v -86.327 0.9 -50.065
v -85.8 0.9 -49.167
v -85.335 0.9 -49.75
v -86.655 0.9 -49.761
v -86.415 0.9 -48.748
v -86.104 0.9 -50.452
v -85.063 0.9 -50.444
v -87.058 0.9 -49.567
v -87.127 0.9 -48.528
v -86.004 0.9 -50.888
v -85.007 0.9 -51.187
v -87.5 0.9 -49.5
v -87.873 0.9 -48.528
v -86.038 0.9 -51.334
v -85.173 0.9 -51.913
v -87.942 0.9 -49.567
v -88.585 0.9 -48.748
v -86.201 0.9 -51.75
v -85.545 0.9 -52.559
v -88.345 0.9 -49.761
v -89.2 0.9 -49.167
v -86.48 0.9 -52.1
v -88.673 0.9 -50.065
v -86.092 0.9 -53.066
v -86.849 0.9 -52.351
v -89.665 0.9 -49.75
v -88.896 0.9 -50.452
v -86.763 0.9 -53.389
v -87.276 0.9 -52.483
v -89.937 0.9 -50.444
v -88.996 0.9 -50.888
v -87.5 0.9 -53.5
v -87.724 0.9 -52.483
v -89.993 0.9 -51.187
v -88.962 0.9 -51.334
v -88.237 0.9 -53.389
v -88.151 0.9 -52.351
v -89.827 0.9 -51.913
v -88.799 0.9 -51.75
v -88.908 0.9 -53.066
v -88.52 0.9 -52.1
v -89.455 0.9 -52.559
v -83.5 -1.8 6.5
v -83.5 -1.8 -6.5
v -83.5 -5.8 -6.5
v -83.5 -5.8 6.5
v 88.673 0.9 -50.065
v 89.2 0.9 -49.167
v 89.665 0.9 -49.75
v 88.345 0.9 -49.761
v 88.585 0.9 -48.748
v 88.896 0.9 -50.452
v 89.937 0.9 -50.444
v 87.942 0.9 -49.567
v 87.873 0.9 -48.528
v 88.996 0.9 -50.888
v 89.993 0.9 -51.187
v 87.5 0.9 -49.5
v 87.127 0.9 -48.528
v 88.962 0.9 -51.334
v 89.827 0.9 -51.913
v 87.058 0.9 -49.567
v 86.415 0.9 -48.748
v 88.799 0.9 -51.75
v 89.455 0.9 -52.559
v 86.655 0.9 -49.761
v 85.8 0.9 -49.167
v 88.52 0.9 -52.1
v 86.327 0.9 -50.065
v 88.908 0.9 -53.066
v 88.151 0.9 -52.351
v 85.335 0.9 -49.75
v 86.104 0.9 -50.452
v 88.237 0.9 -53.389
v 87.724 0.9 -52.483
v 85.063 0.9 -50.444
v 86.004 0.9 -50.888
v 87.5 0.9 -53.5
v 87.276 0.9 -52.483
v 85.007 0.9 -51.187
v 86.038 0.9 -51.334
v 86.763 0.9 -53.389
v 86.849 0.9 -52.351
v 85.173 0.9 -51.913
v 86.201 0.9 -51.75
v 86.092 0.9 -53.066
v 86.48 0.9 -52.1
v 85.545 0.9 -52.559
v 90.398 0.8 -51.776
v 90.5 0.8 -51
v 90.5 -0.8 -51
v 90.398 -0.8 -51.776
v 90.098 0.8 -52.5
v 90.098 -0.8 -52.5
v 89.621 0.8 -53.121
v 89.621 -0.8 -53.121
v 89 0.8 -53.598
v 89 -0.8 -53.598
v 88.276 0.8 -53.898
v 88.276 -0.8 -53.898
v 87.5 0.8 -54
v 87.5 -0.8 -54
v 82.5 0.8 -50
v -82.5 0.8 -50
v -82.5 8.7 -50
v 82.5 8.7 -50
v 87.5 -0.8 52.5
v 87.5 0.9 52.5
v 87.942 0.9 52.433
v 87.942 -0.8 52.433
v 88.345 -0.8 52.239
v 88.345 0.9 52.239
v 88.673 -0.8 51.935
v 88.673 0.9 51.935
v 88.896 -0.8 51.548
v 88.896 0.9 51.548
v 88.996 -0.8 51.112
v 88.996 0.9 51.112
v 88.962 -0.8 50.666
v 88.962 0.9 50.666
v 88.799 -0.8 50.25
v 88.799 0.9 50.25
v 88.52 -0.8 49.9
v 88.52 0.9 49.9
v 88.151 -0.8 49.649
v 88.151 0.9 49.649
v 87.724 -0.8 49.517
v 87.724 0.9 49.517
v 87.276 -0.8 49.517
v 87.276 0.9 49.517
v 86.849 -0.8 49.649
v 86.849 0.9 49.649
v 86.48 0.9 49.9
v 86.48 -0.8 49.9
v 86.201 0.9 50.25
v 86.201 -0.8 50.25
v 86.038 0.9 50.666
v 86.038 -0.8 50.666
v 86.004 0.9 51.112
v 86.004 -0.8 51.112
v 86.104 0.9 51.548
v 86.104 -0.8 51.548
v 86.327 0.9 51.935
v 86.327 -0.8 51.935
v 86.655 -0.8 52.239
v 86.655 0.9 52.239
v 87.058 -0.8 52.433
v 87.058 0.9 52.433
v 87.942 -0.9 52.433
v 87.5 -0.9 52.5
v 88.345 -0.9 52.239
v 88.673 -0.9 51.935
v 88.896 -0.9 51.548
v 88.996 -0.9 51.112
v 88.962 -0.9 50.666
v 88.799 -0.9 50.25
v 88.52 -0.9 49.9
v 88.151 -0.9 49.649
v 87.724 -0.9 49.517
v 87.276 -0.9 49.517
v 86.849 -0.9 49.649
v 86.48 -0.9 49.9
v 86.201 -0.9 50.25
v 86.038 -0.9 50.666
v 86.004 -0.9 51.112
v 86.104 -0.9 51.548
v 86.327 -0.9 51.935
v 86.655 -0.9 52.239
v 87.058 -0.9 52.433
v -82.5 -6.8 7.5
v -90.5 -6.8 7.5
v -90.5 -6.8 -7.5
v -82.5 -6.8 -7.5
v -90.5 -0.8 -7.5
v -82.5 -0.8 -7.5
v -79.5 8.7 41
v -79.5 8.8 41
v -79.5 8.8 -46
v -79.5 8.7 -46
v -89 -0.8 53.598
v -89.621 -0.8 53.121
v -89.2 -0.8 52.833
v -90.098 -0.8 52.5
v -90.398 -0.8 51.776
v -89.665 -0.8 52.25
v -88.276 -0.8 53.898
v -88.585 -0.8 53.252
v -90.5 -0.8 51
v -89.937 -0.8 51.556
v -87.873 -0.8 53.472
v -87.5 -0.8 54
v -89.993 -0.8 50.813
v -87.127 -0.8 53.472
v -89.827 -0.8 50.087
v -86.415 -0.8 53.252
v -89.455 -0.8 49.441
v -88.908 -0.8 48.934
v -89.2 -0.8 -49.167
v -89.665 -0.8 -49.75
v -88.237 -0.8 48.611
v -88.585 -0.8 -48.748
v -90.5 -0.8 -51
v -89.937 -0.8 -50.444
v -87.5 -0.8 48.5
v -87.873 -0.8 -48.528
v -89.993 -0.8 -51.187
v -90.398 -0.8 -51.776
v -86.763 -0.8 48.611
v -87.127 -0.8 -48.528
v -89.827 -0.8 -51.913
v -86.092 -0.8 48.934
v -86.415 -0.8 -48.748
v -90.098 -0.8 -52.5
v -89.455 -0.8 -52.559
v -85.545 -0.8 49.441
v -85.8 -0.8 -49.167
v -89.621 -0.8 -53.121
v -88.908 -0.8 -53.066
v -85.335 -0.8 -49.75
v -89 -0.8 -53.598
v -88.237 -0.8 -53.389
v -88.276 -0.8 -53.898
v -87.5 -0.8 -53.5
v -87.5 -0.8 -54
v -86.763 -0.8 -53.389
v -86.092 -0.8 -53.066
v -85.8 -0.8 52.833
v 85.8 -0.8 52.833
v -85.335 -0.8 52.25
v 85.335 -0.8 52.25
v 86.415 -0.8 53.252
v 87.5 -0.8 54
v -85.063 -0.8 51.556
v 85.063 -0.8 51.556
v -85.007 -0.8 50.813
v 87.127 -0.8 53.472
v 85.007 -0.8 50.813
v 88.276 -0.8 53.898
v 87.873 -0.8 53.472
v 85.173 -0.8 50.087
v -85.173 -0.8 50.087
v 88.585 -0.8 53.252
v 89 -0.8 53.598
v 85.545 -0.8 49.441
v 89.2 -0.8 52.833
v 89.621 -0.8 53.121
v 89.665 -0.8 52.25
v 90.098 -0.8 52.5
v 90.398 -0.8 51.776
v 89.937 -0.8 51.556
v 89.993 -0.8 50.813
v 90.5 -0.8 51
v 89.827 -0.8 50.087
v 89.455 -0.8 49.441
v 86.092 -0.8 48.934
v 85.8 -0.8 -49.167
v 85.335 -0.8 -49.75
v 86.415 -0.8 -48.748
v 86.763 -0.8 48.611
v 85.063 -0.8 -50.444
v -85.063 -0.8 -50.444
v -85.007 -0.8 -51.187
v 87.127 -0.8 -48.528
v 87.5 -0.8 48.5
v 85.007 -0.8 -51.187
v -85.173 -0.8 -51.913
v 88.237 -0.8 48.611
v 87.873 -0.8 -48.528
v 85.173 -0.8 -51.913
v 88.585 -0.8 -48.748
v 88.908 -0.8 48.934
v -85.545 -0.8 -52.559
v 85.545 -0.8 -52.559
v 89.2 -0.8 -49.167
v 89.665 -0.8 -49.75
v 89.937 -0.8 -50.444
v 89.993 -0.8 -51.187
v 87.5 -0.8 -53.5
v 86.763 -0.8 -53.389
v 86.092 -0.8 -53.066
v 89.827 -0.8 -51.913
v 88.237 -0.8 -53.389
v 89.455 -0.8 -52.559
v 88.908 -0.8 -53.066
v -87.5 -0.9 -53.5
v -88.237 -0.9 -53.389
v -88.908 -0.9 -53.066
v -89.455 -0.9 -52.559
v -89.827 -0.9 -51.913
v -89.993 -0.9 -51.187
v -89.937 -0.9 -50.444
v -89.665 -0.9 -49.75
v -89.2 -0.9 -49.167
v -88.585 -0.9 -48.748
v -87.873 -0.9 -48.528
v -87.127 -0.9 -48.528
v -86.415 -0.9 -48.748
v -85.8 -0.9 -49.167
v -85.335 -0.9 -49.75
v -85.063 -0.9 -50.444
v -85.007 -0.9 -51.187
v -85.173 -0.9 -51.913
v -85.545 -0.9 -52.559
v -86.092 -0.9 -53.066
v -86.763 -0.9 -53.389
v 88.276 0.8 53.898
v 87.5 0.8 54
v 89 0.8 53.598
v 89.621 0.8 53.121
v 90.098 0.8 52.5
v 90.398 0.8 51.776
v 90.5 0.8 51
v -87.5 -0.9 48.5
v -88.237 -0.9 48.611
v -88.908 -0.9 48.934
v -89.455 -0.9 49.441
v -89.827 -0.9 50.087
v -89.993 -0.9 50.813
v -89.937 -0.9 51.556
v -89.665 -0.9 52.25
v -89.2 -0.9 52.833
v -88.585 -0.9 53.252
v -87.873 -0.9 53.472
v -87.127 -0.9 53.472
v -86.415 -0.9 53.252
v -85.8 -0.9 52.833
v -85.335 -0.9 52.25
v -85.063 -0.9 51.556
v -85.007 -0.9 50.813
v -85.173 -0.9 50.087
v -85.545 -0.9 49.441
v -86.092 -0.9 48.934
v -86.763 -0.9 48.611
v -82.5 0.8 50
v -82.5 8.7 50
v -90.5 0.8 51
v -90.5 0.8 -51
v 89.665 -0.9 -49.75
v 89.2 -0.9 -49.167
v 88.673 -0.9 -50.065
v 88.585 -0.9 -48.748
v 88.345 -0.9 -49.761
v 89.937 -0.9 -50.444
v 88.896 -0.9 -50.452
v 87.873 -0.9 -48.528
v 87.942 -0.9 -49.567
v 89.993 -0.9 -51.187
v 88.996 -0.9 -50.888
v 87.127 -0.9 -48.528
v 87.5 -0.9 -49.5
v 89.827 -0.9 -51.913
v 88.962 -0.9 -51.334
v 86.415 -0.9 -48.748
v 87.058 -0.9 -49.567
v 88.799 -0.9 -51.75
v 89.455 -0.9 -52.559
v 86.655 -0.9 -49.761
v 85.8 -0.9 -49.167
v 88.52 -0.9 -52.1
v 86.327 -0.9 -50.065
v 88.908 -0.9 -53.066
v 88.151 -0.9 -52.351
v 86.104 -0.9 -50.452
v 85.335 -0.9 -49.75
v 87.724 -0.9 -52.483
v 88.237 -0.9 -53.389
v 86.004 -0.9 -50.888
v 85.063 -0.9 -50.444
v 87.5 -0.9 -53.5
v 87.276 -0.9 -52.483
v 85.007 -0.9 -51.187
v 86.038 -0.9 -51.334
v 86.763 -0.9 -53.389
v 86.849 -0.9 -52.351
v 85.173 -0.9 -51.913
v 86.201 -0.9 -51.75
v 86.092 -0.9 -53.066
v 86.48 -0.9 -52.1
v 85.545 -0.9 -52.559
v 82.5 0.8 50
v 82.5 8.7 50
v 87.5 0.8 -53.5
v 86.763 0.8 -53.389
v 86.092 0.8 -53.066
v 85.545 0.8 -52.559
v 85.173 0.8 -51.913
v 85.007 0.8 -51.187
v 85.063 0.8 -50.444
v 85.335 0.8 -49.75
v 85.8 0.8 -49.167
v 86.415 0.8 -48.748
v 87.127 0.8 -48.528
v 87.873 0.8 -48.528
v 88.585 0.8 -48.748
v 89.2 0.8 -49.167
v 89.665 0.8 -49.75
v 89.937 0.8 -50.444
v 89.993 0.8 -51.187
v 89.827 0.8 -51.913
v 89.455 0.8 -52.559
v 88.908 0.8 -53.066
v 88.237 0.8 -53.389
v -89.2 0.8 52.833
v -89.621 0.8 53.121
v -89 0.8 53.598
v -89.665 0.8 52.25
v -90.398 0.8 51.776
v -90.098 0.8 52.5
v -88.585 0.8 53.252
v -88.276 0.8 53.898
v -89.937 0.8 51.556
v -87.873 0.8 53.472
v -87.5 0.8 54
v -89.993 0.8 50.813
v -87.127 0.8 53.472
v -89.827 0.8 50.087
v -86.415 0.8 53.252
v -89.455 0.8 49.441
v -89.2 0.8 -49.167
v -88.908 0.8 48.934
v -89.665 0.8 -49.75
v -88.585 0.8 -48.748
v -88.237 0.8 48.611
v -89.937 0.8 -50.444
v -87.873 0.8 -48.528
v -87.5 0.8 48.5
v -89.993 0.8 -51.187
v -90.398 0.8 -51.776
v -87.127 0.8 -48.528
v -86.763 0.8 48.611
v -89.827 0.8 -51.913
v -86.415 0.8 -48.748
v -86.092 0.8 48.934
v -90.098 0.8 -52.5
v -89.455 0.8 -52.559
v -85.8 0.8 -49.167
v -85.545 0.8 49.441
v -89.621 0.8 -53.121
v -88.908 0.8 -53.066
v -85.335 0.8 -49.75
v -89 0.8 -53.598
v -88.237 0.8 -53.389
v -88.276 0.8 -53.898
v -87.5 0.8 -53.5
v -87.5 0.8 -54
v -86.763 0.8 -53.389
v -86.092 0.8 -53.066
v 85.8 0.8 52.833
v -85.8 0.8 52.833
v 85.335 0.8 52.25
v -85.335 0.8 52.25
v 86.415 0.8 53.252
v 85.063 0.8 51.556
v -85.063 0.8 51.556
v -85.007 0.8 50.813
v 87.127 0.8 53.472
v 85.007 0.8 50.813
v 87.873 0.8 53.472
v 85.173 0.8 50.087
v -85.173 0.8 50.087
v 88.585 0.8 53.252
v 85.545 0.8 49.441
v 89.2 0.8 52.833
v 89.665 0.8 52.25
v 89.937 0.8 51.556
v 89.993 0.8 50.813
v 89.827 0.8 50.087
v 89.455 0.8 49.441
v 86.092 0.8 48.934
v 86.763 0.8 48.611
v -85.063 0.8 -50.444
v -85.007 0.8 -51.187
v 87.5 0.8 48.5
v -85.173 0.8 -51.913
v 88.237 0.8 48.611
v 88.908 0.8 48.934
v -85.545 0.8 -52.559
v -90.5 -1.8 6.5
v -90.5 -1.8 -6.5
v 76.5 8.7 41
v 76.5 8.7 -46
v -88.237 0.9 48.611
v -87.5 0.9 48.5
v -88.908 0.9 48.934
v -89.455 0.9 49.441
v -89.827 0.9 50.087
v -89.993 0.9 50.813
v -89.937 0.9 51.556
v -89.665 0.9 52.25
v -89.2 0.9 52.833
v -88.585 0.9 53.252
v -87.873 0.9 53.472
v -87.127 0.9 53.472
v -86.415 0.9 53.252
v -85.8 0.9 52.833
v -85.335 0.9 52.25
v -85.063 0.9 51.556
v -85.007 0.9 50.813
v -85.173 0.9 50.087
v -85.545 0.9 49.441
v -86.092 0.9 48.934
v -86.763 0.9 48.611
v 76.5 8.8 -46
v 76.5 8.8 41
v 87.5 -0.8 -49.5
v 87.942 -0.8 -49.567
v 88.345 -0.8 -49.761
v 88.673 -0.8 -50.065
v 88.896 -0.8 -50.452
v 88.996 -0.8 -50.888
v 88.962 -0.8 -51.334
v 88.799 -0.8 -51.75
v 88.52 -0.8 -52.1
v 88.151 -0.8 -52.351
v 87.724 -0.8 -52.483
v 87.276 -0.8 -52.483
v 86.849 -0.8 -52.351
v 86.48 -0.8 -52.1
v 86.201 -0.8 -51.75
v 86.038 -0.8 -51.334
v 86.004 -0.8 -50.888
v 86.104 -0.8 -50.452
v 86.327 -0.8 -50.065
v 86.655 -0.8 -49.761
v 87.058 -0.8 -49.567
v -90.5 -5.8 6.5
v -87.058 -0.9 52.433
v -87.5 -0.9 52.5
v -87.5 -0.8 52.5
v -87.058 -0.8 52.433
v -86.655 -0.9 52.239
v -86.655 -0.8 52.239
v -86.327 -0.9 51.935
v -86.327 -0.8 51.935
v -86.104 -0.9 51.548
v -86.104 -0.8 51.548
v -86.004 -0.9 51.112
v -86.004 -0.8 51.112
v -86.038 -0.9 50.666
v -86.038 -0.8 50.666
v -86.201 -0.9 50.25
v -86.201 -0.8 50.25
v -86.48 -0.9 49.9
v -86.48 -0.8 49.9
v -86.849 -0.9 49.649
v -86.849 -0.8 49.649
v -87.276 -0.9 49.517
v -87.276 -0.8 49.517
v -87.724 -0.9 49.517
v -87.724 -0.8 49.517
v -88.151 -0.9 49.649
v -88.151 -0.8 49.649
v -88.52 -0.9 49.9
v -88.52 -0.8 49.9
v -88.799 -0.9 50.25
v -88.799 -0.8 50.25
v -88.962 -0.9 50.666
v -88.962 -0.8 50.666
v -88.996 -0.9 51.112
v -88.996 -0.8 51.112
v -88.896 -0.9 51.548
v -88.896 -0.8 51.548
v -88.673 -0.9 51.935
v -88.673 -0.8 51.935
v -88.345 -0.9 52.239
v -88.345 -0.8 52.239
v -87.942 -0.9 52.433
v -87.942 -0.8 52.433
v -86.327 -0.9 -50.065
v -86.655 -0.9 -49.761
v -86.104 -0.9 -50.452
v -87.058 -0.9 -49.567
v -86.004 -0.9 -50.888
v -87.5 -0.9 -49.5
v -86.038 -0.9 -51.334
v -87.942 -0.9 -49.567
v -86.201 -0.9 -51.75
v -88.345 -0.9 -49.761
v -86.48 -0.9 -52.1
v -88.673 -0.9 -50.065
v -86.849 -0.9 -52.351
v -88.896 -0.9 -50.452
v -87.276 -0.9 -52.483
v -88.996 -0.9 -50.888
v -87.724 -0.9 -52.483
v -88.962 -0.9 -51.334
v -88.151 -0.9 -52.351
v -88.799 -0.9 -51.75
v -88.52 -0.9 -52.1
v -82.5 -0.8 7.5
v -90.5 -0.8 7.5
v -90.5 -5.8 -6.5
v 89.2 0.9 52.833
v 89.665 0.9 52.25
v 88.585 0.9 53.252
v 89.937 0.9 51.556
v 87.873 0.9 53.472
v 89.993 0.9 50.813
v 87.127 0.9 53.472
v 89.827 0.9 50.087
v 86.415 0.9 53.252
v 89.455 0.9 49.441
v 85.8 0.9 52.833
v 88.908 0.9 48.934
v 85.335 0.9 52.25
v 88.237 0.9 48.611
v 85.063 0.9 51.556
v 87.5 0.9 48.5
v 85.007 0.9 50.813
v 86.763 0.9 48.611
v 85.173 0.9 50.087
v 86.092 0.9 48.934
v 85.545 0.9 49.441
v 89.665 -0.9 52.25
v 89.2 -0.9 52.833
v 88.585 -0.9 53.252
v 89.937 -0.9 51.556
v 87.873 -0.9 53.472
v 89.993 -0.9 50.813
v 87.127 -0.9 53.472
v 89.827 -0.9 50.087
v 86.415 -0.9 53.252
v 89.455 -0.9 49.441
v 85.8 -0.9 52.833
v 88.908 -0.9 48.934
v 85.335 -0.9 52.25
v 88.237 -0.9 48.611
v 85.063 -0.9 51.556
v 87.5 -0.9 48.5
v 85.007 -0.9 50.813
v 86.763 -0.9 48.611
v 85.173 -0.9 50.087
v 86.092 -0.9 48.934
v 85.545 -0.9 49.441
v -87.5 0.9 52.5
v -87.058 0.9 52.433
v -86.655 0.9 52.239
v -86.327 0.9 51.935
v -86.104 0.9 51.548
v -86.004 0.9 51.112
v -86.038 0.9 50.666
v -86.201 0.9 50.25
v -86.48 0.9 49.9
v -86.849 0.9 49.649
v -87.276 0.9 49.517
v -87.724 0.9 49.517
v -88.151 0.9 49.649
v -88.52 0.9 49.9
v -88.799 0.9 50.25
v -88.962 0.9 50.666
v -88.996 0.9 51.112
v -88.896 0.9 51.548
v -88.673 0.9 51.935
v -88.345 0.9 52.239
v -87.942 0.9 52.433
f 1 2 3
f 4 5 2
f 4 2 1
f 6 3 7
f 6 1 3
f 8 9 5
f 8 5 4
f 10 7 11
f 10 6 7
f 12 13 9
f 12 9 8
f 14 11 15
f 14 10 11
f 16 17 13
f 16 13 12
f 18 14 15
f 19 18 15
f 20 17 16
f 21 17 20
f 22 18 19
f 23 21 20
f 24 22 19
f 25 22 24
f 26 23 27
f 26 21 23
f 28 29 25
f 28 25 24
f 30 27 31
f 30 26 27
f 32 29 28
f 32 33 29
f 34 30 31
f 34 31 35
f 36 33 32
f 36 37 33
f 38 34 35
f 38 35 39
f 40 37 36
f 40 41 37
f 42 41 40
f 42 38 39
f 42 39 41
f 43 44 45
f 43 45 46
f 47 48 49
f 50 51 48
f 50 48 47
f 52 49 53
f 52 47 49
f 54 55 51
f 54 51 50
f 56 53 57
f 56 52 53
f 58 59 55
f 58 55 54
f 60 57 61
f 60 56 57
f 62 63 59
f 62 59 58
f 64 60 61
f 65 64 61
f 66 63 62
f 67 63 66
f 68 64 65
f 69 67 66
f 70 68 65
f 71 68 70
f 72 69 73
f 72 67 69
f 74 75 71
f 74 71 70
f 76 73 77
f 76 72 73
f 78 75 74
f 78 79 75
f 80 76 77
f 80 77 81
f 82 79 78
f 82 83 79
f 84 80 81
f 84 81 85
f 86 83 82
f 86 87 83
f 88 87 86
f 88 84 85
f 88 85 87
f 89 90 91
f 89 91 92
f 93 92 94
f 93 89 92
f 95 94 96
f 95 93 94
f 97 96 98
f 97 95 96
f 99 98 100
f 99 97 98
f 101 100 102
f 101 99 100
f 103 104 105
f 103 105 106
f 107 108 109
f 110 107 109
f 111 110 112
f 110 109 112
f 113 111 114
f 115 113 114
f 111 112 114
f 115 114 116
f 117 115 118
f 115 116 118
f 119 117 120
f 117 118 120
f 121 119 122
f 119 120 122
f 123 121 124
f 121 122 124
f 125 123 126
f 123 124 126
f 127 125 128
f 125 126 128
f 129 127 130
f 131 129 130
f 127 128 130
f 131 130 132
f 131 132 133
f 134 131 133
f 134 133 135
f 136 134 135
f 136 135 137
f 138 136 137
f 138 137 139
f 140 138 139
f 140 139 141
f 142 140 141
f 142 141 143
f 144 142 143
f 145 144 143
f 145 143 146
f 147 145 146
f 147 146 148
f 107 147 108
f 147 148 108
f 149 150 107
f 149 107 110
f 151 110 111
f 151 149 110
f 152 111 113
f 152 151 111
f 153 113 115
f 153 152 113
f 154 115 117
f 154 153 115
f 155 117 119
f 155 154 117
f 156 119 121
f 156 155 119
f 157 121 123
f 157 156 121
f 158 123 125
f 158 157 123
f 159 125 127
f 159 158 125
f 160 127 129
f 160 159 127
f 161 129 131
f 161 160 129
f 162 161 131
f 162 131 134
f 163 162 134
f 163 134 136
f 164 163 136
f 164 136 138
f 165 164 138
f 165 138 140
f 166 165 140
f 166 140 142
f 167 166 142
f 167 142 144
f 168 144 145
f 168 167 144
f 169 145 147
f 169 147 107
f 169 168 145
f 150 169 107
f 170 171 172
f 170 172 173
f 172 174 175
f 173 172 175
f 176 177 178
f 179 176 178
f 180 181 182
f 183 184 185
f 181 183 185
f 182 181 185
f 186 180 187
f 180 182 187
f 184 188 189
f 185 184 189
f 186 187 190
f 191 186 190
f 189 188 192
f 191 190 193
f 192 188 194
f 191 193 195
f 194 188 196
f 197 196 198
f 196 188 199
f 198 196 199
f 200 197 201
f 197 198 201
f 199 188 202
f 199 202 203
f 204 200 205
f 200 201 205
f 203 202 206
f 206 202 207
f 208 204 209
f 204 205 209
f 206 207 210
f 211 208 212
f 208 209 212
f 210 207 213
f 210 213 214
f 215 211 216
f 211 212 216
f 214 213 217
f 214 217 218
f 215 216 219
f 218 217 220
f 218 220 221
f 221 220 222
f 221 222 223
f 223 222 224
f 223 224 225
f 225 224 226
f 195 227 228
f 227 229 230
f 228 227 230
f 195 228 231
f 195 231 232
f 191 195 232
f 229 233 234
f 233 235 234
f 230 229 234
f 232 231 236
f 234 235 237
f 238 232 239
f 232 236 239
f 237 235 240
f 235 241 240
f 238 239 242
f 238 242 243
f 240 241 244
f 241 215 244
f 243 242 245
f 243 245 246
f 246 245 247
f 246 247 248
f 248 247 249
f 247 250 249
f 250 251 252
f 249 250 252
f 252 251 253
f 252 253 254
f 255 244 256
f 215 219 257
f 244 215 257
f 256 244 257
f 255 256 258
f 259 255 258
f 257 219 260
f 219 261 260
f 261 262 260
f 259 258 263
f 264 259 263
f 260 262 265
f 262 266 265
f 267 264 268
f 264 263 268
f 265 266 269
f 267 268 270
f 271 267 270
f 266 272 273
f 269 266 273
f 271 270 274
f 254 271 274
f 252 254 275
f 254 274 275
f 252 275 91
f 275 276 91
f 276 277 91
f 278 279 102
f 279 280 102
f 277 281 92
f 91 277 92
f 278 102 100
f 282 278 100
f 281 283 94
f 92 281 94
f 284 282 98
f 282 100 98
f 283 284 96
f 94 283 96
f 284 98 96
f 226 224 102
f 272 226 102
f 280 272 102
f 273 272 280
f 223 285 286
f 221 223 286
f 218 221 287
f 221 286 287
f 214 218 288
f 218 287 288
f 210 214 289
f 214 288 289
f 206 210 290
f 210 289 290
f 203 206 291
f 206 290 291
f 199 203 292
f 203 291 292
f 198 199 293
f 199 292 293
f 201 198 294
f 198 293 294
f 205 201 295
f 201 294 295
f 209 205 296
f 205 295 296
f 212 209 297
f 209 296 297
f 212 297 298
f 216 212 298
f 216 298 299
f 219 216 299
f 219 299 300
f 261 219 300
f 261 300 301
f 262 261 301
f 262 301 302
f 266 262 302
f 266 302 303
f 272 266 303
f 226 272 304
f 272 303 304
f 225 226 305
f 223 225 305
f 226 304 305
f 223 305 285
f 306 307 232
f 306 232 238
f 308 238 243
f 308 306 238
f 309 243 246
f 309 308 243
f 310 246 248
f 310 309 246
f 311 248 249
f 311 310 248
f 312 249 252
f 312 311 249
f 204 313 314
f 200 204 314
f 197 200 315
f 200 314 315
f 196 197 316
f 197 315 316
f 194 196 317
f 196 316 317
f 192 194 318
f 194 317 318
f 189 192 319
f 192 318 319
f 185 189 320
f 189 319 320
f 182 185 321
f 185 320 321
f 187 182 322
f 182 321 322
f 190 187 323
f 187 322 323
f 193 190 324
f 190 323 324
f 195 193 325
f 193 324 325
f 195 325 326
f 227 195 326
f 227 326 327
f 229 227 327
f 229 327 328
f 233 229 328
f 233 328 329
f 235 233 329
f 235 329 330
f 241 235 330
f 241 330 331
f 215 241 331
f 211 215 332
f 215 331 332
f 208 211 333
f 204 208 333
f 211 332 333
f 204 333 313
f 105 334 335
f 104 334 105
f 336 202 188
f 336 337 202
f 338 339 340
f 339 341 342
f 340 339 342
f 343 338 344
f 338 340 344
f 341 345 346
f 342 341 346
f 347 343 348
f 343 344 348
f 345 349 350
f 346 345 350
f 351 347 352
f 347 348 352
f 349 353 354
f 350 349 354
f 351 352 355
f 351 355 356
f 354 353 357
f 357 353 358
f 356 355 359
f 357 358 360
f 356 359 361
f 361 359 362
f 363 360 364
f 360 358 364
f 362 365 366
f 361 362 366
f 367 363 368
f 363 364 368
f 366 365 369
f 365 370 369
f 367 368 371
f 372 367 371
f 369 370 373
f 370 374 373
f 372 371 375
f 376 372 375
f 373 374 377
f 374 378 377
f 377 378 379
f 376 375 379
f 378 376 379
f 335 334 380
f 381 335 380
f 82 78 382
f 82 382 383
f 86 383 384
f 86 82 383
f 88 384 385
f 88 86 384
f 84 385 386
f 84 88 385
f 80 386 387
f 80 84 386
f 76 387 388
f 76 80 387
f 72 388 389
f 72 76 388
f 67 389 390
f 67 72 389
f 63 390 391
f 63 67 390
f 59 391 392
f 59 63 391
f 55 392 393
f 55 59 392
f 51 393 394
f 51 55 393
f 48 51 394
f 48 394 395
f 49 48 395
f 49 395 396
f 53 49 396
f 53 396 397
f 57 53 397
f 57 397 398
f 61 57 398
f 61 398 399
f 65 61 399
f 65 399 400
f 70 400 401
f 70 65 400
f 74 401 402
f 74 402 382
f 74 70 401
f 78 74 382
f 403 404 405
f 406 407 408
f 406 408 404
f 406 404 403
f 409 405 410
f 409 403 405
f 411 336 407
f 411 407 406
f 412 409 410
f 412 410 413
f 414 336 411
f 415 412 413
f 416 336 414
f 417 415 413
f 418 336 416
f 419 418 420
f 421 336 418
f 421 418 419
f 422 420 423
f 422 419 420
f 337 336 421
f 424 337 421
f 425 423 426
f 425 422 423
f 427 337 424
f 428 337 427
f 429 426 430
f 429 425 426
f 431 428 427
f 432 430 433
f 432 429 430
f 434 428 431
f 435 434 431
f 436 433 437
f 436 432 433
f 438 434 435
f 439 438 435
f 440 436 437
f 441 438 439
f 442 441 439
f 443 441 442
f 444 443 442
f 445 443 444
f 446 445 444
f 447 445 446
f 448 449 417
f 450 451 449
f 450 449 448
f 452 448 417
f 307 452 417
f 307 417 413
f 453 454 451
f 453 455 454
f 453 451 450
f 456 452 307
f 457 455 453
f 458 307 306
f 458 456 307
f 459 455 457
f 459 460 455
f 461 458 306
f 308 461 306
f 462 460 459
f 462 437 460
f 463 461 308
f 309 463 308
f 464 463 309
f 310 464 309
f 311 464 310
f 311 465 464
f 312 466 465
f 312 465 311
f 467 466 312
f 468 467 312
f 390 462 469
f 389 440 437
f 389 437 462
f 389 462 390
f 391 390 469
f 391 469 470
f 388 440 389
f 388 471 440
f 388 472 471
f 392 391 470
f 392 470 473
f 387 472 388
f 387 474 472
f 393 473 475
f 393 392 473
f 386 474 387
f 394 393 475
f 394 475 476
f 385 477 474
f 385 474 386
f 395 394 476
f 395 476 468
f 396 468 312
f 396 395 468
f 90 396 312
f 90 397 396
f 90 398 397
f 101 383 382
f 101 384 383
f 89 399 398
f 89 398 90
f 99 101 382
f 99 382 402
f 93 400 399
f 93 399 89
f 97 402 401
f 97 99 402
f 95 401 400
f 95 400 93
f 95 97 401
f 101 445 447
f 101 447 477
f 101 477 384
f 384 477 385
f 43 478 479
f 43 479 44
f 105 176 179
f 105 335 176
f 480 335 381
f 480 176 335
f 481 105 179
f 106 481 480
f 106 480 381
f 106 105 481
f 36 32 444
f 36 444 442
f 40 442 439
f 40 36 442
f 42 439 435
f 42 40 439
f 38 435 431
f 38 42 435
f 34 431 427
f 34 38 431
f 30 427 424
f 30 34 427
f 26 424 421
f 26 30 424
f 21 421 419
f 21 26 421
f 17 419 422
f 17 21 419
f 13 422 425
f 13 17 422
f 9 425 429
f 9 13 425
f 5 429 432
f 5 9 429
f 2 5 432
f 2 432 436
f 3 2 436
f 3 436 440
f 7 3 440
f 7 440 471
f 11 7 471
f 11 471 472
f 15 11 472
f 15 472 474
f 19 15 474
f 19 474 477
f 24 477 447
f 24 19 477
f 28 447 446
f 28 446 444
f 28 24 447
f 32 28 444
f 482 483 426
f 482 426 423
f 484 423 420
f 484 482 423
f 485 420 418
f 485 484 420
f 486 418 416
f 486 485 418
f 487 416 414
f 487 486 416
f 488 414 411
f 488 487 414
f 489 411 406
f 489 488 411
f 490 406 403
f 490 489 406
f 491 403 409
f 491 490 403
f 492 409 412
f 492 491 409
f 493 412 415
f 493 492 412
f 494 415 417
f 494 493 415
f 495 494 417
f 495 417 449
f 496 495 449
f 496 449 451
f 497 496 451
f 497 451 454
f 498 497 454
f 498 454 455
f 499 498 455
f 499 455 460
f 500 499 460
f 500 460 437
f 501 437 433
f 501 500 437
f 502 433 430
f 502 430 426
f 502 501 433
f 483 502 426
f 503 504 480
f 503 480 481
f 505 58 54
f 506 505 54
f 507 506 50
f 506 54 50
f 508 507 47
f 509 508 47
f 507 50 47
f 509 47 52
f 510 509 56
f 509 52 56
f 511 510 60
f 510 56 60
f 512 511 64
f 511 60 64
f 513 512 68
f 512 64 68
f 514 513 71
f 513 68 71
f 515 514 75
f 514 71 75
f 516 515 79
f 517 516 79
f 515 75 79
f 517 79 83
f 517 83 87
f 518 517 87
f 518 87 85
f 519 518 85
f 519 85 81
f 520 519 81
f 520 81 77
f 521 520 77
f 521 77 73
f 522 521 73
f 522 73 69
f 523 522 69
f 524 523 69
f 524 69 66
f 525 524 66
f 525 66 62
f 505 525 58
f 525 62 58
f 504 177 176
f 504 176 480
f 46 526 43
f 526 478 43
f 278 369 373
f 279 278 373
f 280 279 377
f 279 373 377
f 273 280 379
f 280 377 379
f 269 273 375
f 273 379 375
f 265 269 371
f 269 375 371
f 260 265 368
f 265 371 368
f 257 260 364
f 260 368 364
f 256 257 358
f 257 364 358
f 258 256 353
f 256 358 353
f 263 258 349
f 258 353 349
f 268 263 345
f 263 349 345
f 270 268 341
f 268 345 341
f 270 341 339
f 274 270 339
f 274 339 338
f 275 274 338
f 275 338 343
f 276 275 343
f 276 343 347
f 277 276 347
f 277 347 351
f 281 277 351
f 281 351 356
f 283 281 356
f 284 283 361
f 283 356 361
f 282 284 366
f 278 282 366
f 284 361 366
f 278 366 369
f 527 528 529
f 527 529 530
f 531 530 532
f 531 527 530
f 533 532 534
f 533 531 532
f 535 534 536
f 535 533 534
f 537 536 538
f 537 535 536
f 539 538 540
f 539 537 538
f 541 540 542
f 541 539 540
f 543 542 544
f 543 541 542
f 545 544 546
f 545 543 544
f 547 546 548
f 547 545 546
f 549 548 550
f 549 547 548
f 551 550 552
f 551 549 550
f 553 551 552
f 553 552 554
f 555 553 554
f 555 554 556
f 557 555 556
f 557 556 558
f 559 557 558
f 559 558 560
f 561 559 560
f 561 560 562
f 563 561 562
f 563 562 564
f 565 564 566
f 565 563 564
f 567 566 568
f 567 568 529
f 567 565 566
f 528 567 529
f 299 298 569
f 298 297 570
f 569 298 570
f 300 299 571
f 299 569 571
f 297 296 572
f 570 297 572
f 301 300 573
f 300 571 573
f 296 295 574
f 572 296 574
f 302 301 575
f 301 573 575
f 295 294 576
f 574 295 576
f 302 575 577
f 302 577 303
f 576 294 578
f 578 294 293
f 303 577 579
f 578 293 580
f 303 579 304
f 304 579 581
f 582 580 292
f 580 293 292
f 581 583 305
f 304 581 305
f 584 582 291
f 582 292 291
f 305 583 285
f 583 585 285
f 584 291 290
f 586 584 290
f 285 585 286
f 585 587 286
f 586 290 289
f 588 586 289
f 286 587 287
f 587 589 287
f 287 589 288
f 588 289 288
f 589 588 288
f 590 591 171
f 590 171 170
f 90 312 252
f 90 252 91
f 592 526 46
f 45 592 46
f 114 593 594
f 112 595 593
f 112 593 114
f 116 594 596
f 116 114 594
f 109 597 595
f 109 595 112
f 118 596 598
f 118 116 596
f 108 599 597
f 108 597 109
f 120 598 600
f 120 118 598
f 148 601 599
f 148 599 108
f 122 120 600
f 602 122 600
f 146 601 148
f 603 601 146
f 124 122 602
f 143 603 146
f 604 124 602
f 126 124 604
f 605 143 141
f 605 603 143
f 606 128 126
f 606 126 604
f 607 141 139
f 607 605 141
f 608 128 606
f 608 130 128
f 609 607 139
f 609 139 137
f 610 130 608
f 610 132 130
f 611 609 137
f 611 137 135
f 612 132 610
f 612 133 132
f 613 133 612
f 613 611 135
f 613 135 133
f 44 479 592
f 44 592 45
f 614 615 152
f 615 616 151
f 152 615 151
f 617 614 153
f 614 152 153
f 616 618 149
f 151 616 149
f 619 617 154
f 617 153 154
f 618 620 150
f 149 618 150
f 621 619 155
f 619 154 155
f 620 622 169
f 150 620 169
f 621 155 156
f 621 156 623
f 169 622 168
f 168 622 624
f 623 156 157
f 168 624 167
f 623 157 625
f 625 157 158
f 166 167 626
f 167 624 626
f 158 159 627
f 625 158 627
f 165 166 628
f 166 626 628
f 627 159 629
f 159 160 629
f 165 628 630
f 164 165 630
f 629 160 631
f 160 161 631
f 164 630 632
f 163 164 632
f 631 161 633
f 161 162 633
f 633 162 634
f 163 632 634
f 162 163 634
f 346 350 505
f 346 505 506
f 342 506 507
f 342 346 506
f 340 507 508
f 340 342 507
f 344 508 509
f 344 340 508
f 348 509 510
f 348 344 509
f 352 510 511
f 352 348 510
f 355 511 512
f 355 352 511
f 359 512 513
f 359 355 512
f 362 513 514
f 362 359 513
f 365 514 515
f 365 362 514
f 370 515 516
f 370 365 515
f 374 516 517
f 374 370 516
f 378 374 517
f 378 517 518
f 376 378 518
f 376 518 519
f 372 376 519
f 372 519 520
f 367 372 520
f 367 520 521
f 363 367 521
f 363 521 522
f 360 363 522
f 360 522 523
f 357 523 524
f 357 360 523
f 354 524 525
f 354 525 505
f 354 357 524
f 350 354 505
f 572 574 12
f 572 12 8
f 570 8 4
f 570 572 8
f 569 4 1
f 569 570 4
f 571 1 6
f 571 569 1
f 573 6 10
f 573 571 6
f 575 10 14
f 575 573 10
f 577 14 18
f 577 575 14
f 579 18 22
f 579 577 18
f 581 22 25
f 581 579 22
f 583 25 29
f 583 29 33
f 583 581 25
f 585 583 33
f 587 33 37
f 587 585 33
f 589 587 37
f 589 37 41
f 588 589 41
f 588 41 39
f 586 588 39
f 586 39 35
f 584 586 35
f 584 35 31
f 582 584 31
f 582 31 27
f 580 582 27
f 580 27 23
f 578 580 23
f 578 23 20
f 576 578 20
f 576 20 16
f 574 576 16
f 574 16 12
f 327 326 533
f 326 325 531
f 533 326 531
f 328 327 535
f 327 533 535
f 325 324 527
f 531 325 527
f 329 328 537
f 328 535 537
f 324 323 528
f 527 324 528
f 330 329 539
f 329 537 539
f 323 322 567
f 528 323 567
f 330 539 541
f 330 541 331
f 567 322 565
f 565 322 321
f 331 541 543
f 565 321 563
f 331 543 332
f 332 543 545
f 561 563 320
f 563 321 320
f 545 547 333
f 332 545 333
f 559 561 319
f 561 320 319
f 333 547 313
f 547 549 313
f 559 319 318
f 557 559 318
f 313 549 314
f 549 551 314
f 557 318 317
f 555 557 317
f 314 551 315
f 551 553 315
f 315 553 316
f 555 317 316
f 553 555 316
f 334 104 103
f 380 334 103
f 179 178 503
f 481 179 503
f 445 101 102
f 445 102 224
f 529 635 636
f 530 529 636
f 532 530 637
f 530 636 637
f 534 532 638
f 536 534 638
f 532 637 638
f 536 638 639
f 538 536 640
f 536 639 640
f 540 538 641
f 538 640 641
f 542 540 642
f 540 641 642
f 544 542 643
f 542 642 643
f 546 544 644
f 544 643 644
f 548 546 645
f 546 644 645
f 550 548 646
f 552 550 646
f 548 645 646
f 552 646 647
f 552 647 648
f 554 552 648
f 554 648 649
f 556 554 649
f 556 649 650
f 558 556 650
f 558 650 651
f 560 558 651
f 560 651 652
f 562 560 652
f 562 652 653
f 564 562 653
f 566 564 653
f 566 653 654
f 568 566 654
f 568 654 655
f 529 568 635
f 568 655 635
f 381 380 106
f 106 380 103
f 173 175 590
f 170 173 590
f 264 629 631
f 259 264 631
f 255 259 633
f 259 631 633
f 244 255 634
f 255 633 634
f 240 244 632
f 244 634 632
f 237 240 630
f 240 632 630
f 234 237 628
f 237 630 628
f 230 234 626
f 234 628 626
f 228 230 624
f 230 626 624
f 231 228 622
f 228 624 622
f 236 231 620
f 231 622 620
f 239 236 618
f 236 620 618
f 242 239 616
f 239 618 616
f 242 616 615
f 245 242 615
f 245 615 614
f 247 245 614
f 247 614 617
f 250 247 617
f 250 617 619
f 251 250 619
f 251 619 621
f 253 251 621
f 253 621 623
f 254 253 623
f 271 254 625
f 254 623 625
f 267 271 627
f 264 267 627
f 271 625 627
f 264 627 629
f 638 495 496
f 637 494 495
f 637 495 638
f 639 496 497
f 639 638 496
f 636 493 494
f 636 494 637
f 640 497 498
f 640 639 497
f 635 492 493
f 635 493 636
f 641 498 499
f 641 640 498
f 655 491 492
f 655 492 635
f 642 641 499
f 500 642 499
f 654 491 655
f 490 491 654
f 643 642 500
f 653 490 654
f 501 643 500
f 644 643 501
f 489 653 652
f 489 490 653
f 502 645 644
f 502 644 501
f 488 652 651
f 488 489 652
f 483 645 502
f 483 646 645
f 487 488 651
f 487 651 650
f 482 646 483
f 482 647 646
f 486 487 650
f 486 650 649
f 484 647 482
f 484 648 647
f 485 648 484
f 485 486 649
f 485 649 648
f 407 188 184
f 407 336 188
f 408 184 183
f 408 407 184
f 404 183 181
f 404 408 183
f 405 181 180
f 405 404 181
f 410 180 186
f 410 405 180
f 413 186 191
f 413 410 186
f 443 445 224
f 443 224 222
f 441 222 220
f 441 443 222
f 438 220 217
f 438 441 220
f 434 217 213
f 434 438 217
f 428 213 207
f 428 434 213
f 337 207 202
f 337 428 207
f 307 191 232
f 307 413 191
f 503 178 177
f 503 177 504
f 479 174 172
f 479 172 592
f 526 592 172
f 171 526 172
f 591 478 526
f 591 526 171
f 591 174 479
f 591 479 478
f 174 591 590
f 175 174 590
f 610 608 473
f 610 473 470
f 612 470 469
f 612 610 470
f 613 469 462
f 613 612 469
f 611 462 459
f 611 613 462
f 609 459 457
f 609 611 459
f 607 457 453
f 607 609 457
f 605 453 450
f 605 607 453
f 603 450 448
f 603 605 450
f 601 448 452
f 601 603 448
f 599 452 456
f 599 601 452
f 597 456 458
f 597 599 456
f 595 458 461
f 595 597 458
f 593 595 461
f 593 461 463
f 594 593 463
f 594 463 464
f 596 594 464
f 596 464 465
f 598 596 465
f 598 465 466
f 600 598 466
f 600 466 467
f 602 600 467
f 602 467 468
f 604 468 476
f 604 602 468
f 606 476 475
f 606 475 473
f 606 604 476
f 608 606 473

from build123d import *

# Parameters (mm, degrees)
BOSS_EXTRUDE1_DEPTH = 0.8
SKETCH2_R           = 1.5
CUT_EXTRUDE1_DEPTH  = 106.398339645
BOSS_EXTRUDE2_START = 0.1
SKETCH3_R           = 2.5
SKETCH3_R_2         = 1.5
BOSS_EXTRUDE2_DEPTH = 0.1
SKETCH4_W           = 165
SKETCH4_H           = 100
BOSS_EXTRUDE3_DEPTH = 8
SKETCH5_OUTSIDE_W   = 225.2
SKETCH5_OUTSIDE_H   = 152.2
SKETCH5_OUTSIDE_W_2 = 156
SKETCH5_OUTSIDE_H_2 = 87
CUT_EXTRUDE2_DEPTH  = 0.1
SKETCH6_W           = 8
SKETCH6_H           = 15
BOSS_EXTRUDE4_DEPTH = 6
SHELL1_T            = -1


with BuildPart() as part:
    # Sketch1 → Boss-Extrude1 (new, symmetric)
    with BuildSketch(Plane(origin=(0, 0, 0), x_dir=(1, 0, 0), z_dir=(0, 1, 0))):
        with BuildLine():
            Line((-87.5, -54), (87.5, -54))
            ThreePointArc((87.5, -54), (89.621320344, -53.121320344), (90.5, -51))
            Line((90.5, -51), (90.5, 51))
            ThreePointArc((90.5, 51), (89.621320344, 53.121320344), (87.5, 54))
            Line((87.5, 54), (-87.5, 54))
            ThreePointArc((-87.5, 54), (-89.621320344, 53.121320344), (-90.5, 51))
            Line((-90.5, 51), (-90.5, -51))
            ThreePointArc((-90.5, -51), (-89.621320344, -53.121320344), (-87.5, -54))
        make_face()
    extrude(amount=BOSS_EXTRUDE1_DEPTH, both=True)

    # Sketch2 → Cut-Extrude1 (cut, through all)
    with BuildSketch(Plane(origin=(0, 0.8, 0), x_dir=(1, 0, 0), z_dir=(0, 1, 0))):
        with Locations(Location((-87.5, 51, 0), (0, 0, 270))):
            Circle(SKETCH2_R)
        with Locations(Location((-87.5, -51, 0), (0, 0, 270))):
            Circle(SKETCH2_R)
        with Locations(Location((87.5, -51, 0), (0, 0, 270))):
            Circle(SKETCH2_R)
        with Locations(Location((87.5, 51, 0), (0, 0, 270))):
            Circle(SKETCH2_R)
    extrude(amount=-CUT_EXTRUDE1_DEPTH, mode=Mode.SUBTRACT)

    # Sketch3 → Boss-Extrude2 (add)
    # profile 1 of 4: a face of its own
    with BuildSketch(Plane(origin=(0, 0.8, 0), x_dir=(1, 0, 0), z_dir=(0, 1, 0)).offset(BOSS_EXTRUDE2_START)):
        with Locations(Location((-87.5, 51, 0), (0, 0, 90))):
            Circle(SKETCH3_R)
        with Locations(Location((-87.5, 51, 0), (0, 0, 270))):
            Circle(SKETCH3_R_2, mode=Mode.SUBTRACT)
    # profile 2 of 4: a face of its own
    with BuildSketch(Plane(origin=(0, 0.8, 0), x_dir=(1, 0, 0), z_dir=(0, 1, 0)).offset(BOSS_EXTRUDE2_START)):
        with Locations(Location((87.5, 51, 0), (0, 0, 90))):
            Circle(SKETCH3_R)
        with Locations(Location((87.5, 51, 0), (0, 0, 270))):
            Circle(SKETCH3_R_2, mode=Mode.SUBTRACT)
    # profile 3 of 4: a face of its own
    with BuildSketch(Plane(origin=(0, 0.8, 0), x_dir=(1, 0, 0), z_dir=(0, 1, 0)).offset(BOSS_EXTRUDE2_START)):
        with Locations(Location((87.5, -51, 0), (0, 0, 90))):
            Circle(SKETCH3_R)
        with Locations(Location((87.5, -51, 0), (0, 0, 270))):
            Circle(SKETCH3_R_2, mode=Mode.SUBTRACT)
    # profile 4 of 4: a face of its own
    with BuildSketch(Plane(origin=(0, 0.8, 0), x_dir=(1, 0, 0), z_dir=(0, 1, 0)).offset(BOSS_EXTRUDE2_START)):
        with Locations(Location((-87.5, -51, 0), (0, 0, 90))):
            Circle(SKETCH3_R)
        with Locations(Location((-87.5, -51, 0), (0, 0, 270))):
            Circle(SKETCH3_R_2, mode=Mode.SUBTRACT)
    boss_extrude2 = extrude(amount=-BOSS_EXTRUDE2_DEPTH)

    # Mirror1: Boss-Extrude2 across plane
    add(boss_extrude2.mirror(Plane.ZX))


with BuildPart() as body_2:
    # Sketch4 → Boss-Extrude3 (new body)
    with BuildSketch(Plane(origin=(0, 0.8, 0), x_dir=(1, 0, 0), z_dir=(0, 1, 0))):
        Rectangle(SKETCH4_W, SKETCH4_H)
    extrude(amount=BOSS_EXTRUDE3_DEPTH)

    # Sketch5 outside → Cut-Extrude2 (cut)
    with BuildSketch(Plane(origin=(0, 8.8, 0), x_dir=(1, 0, 0), z_dir=(0, 1, 0))):
        Rectangle(SKETCH5_OUTSIDE_W, SKETCH5_OUTSIDE_H)
        with Locations((-1.5, 2.5)):
            Rectangle(SKETCH5_OUTSIDE_W_2, SKETCH5_OUTSIDE_H_2, mode=Mode.SUBTRACT)
    extrude(amount=-CUT_EXTRUDE2_DEPTH, mode=Mode.SUBTRACT)


with BuildPart() as body_3:
    # Sketch6 → Boss-Extrude4 (new body)
    with BuildSketch(Plane.XZ.offset(0.8)):
        with Locations((-86.5, 0)):
            Rectangle(SKETCH6_W, SKETCH6_H)
    extrude(amount=BOSS_EXTRUDE4_DEPTH)

    # Shell1
    shell1_openings = [body_3.faces().sort_by_distance(p)[0] for p in [
        (-90.5, -3.8, 0),
    ]]
    offset(amount=SHELL1_T, openings=shell1_openings, kind=Kind.INTERSECTION)


solid = Compound([part.part, body_2.part, body_3.part])
